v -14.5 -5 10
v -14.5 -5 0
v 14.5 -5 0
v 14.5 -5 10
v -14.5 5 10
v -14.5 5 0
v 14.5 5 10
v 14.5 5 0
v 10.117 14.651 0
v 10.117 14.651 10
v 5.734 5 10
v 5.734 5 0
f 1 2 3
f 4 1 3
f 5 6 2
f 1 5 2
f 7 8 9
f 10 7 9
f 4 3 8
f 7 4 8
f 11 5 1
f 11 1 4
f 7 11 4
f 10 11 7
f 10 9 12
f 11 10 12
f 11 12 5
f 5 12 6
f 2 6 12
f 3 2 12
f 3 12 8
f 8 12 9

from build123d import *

# Parameters (mm, degrees)
F1_DEPTH = 10


with BuildPart() as f1:
    # F0 (on Top) → F1 (new body)
    with BuildSketch(Plane.XY):
        Polygon((5.733538, 5), (-14.5, 5), (-14.5, -5), (14.5, -5), (14.5, 5), align=None)
        Polygon((10.116769, 14.651284), (5.733538, 5), (14.5, 5), align=None)
    extrude(amount=F1_DEPTH)


solid = f1.part
